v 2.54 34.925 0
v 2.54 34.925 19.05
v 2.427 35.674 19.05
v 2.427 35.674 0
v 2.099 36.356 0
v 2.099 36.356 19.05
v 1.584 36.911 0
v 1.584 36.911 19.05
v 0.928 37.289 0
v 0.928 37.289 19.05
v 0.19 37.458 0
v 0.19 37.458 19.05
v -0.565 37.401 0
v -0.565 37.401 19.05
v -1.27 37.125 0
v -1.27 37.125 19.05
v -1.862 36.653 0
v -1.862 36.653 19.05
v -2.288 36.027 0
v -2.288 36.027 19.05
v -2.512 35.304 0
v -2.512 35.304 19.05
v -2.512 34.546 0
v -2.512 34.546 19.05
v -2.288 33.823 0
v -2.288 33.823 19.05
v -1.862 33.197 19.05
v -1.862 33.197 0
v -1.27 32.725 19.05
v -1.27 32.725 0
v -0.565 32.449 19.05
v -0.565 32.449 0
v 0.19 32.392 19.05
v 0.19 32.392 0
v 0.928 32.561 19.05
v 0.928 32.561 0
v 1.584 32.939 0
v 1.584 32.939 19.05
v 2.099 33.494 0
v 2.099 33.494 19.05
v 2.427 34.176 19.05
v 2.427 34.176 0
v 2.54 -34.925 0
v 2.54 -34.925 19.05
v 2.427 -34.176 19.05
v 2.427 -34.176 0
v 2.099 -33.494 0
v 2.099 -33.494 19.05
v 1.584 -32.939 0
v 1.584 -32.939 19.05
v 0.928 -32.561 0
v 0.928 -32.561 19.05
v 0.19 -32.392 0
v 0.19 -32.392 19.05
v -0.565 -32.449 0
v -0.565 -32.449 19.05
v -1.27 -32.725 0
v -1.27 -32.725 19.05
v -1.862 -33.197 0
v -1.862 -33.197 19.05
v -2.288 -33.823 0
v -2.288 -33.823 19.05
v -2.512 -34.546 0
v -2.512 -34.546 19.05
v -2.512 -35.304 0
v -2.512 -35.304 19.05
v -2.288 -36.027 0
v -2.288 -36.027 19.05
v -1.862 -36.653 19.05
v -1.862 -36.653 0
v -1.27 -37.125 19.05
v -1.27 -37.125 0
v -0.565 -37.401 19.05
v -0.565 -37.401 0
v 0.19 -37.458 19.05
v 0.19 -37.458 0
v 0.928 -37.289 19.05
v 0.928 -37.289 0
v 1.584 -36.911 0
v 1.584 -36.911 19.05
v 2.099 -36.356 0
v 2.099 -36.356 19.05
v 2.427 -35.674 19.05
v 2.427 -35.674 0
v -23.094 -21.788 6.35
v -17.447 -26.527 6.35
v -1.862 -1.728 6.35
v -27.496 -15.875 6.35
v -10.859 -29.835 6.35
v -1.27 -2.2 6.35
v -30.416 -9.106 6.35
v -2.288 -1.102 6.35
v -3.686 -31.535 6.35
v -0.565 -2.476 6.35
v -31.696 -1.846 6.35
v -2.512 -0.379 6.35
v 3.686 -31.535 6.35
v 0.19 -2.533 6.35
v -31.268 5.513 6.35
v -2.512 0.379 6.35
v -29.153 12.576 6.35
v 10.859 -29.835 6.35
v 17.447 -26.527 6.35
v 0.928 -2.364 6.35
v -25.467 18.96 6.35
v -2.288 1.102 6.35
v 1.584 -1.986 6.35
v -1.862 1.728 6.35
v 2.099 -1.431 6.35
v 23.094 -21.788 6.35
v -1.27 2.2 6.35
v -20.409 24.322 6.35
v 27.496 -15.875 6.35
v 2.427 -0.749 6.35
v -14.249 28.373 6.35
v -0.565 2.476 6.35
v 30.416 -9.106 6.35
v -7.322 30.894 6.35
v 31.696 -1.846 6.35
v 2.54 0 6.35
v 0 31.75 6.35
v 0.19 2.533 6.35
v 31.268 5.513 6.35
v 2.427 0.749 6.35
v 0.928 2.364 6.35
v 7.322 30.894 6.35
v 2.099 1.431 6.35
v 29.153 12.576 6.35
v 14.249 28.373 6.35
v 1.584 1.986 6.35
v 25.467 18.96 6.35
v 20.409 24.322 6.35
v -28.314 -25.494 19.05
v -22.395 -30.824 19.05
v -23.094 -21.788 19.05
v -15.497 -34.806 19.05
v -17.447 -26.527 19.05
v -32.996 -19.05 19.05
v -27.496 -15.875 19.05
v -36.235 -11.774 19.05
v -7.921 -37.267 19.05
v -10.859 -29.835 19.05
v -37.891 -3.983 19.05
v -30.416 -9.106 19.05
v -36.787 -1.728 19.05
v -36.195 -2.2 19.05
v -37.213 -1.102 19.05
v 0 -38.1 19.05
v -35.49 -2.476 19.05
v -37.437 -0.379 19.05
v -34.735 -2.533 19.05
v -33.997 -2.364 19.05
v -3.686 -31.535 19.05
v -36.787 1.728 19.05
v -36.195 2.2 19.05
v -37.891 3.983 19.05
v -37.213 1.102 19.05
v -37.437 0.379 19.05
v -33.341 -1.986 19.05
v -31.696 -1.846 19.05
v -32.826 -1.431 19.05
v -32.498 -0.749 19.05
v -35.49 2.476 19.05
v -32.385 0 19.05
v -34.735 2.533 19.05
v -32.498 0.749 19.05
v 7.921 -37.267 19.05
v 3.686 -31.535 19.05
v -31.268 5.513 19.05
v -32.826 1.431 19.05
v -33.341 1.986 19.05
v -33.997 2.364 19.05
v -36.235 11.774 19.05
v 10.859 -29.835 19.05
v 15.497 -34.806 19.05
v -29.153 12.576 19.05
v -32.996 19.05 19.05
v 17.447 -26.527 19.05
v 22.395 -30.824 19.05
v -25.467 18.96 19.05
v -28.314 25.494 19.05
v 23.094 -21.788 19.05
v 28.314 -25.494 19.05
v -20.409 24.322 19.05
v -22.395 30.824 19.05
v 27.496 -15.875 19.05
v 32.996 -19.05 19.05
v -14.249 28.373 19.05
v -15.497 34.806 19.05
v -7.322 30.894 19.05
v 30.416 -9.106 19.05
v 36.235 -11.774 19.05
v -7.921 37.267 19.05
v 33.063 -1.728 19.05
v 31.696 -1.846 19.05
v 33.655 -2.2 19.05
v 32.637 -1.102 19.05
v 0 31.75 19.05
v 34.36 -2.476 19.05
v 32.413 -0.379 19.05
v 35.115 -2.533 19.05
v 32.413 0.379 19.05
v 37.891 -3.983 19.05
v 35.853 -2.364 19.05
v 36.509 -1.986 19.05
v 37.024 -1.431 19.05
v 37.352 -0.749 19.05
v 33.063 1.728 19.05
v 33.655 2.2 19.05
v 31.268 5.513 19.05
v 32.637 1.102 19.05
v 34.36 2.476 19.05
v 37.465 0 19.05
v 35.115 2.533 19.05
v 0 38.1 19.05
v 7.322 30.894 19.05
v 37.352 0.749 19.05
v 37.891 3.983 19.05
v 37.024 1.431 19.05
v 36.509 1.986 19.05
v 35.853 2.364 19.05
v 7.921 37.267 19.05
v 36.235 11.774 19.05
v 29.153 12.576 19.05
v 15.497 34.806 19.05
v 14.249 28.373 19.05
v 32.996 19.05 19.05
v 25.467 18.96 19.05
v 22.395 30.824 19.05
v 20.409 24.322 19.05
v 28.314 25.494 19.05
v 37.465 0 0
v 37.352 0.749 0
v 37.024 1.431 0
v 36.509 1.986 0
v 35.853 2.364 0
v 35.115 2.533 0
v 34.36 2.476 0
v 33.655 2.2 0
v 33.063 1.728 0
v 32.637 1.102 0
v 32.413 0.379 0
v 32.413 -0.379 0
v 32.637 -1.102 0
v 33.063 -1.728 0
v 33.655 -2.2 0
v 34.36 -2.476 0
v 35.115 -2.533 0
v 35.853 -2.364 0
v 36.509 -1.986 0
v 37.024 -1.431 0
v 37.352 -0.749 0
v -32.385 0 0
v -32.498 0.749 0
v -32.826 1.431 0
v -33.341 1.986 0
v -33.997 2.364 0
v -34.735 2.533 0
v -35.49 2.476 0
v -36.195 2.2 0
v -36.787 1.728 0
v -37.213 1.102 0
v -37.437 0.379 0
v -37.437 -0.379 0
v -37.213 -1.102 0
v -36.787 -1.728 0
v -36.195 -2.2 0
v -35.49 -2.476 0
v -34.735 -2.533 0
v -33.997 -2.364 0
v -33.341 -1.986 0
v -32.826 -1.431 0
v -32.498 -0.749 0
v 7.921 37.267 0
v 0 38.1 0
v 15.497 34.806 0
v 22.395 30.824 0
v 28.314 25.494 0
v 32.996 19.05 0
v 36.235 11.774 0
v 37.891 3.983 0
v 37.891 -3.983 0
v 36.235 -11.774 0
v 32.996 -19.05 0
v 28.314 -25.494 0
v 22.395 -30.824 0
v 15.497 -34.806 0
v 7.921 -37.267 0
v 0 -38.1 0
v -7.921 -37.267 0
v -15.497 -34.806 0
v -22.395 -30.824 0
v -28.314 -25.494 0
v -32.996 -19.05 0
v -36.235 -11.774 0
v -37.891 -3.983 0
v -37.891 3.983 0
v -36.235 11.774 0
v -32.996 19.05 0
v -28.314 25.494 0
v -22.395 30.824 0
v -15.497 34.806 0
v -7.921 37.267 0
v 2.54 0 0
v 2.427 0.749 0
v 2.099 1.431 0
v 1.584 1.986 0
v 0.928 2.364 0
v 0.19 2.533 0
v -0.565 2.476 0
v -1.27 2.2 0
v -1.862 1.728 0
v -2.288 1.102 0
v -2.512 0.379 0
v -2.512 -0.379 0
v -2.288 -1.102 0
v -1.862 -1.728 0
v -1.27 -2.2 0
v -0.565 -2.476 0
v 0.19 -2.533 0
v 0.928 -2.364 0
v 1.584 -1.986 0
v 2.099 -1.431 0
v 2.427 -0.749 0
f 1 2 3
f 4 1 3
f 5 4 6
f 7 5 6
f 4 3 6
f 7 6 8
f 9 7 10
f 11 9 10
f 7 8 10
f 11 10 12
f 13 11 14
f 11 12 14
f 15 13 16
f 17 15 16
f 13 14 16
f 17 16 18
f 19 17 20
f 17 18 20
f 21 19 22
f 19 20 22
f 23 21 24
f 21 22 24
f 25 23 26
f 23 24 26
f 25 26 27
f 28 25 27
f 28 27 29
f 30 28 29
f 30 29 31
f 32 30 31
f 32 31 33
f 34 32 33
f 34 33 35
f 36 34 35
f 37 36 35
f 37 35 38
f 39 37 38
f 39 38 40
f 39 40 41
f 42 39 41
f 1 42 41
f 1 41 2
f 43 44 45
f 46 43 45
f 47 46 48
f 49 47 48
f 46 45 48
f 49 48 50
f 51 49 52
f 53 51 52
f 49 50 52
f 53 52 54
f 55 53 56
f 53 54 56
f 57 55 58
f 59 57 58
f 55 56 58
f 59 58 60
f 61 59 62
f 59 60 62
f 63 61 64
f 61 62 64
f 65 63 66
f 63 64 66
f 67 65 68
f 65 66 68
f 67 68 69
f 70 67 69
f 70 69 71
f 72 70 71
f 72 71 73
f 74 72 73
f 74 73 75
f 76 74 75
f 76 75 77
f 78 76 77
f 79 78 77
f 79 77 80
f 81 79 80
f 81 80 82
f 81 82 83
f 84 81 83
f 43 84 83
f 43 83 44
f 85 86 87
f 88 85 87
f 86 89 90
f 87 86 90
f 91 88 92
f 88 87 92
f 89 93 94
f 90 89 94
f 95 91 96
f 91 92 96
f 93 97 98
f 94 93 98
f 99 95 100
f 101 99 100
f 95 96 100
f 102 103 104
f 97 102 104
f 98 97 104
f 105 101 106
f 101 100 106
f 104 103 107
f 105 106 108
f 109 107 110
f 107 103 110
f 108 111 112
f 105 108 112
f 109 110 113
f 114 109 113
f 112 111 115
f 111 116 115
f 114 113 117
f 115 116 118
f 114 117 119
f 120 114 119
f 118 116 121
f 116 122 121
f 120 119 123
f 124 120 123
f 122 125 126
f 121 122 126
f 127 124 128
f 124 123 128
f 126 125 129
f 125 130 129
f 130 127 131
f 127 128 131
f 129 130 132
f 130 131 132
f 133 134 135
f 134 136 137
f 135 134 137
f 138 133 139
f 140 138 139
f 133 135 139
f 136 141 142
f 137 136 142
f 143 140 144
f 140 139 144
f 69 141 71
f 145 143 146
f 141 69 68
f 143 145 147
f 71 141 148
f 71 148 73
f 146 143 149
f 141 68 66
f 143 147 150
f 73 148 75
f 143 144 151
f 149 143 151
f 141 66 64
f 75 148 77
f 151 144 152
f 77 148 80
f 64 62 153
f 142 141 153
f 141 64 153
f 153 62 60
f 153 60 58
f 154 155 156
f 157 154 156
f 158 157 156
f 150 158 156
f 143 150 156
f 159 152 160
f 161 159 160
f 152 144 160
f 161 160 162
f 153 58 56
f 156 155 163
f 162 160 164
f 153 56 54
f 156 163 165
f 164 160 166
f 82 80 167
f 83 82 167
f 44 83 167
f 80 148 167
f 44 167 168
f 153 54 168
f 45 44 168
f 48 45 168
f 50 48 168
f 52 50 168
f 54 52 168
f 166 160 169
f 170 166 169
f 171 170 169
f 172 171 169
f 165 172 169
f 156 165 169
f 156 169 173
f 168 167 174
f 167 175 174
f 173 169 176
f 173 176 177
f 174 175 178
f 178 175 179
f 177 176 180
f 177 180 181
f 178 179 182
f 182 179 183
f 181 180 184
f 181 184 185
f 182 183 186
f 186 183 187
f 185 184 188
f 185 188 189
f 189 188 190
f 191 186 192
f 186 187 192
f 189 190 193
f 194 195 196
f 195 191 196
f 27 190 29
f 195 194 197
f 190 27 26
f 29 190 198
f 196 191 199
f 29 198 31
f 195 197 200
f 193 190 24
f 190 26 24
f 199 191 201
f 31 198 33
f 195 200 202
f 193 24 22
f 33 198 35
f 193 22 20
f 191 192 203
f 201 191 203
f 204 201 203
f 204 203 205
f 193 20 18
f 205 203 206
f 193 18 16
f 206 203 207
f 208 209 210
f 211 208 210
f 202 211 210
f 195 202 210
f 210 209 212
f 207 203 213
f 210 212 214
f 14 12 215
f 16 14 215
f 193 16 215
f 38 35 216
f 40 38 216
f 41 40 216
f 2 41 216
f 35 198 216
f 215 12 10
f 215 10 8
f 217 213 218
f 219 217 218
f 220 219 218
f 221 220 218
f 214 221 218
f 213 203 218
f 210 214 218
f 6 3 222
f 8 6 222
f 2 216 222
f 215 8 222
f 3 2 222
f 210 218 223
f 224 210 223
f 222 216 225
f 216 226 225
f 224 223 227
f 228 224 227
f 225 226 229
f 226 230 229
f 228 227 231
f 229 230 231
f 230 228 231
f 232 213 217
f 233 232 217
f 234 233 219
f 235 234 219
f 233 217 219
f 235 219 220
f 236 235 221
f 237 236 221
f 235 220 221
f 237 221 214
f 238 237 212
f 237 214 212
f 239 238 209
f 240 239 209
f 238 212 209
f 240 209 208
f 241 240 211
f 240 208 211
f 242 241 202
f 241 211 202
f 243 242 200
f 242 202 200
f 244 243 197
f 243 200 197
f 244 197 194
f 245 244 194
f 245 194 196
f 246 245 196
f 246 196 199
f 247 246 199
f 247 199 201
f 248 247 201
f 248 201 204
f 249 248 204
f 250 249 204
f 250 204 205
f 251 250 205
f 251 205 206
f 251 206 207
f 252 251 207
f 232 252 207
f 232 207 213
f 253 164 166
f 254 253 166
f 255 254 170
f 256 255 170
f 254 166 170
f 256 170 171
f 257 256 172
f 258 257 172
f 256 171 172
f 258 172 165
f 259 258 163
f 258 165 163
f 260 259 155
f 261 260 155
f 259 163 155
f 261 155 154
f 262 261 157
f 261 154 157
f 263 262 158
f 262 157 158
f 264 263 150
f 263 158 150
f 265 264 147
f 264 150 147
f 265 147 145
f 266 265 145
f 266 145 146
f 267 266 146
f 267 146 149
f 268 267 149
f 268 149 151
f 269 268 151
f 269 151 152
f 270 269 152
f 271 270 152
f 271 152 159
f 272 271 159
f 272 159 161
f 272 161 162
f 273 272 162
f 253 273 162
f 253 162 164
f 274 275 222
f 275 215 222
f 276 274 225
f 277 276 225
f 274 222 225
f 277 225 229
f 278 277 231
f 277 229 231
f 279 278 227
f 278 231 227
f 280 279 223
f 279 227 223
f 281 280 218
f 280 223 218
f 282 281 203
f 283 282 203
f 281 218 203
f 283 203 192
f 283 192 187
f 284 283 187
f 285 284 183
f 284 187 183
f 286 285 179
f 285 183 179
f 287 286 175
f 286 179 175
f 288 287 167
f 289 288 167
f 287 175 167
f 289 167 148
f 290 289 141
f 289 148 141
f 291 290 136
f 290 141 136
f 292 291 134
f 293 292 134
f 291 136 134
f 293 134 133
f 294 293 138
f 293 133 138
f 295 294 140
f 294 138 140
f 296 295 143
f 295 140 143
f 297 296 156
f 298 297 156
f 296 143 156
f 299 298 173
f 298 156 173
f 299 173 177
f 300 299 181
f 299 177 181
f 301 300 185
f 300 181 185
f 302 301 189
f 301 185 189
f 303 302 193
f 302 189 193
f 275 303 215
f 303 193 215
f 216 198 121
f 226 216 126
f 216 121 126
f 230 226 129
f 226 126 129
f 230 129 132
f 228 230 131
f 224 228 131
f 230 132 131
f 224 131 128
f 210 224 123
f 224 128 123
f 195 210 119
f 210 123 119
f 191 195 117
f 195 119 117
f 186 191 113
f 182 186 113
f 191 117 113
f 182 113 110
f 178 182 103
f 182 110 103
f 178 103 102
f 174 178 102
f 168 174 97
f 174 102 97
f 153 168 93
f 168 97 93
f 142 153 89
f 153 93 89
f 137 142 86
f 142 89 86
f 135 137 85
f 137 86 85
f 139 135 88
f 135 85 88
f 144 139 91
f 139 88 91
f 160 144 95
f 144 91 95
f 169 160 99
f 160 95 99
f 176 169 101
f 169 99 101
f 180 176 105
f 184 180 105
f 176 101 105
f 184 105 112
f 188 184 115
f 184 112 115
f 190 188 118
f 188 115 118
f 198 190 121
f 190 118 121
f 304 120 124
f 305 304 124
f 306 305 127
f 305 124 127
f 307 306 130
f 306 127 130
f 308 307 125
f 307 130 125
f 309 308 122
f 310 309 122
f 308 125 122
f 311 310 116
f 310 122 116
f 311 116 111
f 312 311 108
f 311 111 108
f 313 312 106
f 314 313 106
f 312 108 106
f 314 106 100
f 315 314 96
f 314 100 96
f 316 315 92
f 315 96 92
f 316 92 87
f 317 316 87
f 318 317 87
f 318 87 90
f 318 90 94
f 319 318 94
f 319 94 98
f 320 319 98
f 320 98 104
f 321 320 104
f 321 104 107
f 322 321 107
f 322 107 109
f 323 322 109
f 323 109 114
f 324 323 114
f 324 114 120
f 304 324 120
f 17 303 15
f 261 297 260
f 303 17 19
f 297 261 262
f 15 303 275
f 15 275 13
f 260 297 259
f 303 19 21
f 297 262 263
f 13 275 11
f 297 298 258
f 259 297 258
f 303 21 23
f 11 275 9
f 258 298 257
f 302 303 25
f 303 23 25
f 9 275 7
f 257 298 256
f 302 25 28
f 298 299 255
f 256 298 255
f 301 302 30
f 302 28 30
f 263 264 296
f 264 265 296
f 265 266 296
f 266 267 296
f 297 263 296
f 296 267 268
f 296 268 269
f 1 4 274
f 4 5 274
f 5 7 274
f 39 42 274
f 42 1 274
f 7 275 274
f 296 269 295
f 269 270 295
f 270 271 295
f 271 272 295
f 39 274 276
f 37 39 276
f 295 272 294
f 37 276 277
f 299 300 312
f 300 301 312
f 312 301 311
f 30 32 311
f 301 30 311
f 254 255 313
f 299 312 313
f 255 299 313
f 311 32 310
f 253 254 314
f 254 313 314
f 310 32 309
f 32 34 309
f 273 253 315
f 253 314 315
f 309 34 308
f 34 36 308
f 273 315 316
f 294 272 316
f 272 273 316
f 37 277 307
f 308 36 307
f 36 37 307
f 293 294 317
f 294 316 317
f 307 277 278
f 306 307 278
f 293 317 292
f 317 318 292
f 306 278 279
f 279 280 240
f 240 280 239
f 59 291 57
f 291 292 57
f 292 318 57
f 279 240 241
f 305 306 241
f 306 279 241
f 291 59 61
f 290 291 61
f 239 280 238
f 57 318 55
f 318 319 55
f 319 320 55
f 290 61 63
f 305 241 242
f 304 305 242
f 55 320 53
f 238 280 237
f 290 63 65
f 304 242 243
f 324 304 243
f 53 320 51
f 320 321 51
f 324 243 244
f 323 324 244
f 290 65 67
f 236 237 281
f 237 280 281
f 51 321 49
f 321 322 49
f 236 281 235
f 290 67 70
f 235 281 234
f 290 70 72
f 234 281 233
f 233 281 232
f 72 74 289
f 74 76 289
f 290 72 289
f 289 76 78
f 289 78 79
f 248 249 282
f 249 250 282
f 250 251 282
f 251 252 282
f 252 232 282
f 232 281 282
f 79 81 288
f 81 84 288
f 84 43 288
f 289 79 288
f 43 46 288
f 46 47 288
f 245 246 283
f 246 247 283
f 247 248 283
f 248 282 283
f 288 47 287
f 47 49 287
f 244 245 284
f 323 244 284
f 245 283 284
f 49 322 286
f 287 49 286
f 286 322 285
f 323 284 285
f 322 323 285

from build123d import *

# Parameters (mm, degrees)
F2_R     = 2.54
F3_DEPTH = 25.4
F4_R     = 2.54
F5_DEPTH = 25.4


with BuildPart() as f1:
    # F0 (on Right) → F1 (revolve)
    with BuildSketch(Plane.YZ):
        Polygon((0, 6.35), (0, 0), (38.1, 0), (38.1, 19.05), (31.75, 19.05), (31.75, 6.35), align=None)
    revolve(axis=Axis((0, 0, 3.175), (0, 0, -1)))

    # F2 (on face) → F3 (cut)
    with BuildSketch(Plane.XY.offset(6.35)):
        Circle(F2_R)
    extrude(amount=-F3_DEPTH, mode=Mode.SUBTRACT)

    # F4 (on face) → F5 (cut)
    with BuildSketch(Plane.XY.offset(19.05)):
        with Locations((0, 34.925)):
            Circle(F4_R)
        with Locations((34.925, 0)):
            Circle(F4_R)
        with Locations((-34.925, 0)):
            Circle(F4_R)
        with Locations((0, -34.925)):
            Circle(F4_R)
    extrude(amount=-F5_DEPTH, mode=Mode.SUBTRACT)


solid = f1.part
